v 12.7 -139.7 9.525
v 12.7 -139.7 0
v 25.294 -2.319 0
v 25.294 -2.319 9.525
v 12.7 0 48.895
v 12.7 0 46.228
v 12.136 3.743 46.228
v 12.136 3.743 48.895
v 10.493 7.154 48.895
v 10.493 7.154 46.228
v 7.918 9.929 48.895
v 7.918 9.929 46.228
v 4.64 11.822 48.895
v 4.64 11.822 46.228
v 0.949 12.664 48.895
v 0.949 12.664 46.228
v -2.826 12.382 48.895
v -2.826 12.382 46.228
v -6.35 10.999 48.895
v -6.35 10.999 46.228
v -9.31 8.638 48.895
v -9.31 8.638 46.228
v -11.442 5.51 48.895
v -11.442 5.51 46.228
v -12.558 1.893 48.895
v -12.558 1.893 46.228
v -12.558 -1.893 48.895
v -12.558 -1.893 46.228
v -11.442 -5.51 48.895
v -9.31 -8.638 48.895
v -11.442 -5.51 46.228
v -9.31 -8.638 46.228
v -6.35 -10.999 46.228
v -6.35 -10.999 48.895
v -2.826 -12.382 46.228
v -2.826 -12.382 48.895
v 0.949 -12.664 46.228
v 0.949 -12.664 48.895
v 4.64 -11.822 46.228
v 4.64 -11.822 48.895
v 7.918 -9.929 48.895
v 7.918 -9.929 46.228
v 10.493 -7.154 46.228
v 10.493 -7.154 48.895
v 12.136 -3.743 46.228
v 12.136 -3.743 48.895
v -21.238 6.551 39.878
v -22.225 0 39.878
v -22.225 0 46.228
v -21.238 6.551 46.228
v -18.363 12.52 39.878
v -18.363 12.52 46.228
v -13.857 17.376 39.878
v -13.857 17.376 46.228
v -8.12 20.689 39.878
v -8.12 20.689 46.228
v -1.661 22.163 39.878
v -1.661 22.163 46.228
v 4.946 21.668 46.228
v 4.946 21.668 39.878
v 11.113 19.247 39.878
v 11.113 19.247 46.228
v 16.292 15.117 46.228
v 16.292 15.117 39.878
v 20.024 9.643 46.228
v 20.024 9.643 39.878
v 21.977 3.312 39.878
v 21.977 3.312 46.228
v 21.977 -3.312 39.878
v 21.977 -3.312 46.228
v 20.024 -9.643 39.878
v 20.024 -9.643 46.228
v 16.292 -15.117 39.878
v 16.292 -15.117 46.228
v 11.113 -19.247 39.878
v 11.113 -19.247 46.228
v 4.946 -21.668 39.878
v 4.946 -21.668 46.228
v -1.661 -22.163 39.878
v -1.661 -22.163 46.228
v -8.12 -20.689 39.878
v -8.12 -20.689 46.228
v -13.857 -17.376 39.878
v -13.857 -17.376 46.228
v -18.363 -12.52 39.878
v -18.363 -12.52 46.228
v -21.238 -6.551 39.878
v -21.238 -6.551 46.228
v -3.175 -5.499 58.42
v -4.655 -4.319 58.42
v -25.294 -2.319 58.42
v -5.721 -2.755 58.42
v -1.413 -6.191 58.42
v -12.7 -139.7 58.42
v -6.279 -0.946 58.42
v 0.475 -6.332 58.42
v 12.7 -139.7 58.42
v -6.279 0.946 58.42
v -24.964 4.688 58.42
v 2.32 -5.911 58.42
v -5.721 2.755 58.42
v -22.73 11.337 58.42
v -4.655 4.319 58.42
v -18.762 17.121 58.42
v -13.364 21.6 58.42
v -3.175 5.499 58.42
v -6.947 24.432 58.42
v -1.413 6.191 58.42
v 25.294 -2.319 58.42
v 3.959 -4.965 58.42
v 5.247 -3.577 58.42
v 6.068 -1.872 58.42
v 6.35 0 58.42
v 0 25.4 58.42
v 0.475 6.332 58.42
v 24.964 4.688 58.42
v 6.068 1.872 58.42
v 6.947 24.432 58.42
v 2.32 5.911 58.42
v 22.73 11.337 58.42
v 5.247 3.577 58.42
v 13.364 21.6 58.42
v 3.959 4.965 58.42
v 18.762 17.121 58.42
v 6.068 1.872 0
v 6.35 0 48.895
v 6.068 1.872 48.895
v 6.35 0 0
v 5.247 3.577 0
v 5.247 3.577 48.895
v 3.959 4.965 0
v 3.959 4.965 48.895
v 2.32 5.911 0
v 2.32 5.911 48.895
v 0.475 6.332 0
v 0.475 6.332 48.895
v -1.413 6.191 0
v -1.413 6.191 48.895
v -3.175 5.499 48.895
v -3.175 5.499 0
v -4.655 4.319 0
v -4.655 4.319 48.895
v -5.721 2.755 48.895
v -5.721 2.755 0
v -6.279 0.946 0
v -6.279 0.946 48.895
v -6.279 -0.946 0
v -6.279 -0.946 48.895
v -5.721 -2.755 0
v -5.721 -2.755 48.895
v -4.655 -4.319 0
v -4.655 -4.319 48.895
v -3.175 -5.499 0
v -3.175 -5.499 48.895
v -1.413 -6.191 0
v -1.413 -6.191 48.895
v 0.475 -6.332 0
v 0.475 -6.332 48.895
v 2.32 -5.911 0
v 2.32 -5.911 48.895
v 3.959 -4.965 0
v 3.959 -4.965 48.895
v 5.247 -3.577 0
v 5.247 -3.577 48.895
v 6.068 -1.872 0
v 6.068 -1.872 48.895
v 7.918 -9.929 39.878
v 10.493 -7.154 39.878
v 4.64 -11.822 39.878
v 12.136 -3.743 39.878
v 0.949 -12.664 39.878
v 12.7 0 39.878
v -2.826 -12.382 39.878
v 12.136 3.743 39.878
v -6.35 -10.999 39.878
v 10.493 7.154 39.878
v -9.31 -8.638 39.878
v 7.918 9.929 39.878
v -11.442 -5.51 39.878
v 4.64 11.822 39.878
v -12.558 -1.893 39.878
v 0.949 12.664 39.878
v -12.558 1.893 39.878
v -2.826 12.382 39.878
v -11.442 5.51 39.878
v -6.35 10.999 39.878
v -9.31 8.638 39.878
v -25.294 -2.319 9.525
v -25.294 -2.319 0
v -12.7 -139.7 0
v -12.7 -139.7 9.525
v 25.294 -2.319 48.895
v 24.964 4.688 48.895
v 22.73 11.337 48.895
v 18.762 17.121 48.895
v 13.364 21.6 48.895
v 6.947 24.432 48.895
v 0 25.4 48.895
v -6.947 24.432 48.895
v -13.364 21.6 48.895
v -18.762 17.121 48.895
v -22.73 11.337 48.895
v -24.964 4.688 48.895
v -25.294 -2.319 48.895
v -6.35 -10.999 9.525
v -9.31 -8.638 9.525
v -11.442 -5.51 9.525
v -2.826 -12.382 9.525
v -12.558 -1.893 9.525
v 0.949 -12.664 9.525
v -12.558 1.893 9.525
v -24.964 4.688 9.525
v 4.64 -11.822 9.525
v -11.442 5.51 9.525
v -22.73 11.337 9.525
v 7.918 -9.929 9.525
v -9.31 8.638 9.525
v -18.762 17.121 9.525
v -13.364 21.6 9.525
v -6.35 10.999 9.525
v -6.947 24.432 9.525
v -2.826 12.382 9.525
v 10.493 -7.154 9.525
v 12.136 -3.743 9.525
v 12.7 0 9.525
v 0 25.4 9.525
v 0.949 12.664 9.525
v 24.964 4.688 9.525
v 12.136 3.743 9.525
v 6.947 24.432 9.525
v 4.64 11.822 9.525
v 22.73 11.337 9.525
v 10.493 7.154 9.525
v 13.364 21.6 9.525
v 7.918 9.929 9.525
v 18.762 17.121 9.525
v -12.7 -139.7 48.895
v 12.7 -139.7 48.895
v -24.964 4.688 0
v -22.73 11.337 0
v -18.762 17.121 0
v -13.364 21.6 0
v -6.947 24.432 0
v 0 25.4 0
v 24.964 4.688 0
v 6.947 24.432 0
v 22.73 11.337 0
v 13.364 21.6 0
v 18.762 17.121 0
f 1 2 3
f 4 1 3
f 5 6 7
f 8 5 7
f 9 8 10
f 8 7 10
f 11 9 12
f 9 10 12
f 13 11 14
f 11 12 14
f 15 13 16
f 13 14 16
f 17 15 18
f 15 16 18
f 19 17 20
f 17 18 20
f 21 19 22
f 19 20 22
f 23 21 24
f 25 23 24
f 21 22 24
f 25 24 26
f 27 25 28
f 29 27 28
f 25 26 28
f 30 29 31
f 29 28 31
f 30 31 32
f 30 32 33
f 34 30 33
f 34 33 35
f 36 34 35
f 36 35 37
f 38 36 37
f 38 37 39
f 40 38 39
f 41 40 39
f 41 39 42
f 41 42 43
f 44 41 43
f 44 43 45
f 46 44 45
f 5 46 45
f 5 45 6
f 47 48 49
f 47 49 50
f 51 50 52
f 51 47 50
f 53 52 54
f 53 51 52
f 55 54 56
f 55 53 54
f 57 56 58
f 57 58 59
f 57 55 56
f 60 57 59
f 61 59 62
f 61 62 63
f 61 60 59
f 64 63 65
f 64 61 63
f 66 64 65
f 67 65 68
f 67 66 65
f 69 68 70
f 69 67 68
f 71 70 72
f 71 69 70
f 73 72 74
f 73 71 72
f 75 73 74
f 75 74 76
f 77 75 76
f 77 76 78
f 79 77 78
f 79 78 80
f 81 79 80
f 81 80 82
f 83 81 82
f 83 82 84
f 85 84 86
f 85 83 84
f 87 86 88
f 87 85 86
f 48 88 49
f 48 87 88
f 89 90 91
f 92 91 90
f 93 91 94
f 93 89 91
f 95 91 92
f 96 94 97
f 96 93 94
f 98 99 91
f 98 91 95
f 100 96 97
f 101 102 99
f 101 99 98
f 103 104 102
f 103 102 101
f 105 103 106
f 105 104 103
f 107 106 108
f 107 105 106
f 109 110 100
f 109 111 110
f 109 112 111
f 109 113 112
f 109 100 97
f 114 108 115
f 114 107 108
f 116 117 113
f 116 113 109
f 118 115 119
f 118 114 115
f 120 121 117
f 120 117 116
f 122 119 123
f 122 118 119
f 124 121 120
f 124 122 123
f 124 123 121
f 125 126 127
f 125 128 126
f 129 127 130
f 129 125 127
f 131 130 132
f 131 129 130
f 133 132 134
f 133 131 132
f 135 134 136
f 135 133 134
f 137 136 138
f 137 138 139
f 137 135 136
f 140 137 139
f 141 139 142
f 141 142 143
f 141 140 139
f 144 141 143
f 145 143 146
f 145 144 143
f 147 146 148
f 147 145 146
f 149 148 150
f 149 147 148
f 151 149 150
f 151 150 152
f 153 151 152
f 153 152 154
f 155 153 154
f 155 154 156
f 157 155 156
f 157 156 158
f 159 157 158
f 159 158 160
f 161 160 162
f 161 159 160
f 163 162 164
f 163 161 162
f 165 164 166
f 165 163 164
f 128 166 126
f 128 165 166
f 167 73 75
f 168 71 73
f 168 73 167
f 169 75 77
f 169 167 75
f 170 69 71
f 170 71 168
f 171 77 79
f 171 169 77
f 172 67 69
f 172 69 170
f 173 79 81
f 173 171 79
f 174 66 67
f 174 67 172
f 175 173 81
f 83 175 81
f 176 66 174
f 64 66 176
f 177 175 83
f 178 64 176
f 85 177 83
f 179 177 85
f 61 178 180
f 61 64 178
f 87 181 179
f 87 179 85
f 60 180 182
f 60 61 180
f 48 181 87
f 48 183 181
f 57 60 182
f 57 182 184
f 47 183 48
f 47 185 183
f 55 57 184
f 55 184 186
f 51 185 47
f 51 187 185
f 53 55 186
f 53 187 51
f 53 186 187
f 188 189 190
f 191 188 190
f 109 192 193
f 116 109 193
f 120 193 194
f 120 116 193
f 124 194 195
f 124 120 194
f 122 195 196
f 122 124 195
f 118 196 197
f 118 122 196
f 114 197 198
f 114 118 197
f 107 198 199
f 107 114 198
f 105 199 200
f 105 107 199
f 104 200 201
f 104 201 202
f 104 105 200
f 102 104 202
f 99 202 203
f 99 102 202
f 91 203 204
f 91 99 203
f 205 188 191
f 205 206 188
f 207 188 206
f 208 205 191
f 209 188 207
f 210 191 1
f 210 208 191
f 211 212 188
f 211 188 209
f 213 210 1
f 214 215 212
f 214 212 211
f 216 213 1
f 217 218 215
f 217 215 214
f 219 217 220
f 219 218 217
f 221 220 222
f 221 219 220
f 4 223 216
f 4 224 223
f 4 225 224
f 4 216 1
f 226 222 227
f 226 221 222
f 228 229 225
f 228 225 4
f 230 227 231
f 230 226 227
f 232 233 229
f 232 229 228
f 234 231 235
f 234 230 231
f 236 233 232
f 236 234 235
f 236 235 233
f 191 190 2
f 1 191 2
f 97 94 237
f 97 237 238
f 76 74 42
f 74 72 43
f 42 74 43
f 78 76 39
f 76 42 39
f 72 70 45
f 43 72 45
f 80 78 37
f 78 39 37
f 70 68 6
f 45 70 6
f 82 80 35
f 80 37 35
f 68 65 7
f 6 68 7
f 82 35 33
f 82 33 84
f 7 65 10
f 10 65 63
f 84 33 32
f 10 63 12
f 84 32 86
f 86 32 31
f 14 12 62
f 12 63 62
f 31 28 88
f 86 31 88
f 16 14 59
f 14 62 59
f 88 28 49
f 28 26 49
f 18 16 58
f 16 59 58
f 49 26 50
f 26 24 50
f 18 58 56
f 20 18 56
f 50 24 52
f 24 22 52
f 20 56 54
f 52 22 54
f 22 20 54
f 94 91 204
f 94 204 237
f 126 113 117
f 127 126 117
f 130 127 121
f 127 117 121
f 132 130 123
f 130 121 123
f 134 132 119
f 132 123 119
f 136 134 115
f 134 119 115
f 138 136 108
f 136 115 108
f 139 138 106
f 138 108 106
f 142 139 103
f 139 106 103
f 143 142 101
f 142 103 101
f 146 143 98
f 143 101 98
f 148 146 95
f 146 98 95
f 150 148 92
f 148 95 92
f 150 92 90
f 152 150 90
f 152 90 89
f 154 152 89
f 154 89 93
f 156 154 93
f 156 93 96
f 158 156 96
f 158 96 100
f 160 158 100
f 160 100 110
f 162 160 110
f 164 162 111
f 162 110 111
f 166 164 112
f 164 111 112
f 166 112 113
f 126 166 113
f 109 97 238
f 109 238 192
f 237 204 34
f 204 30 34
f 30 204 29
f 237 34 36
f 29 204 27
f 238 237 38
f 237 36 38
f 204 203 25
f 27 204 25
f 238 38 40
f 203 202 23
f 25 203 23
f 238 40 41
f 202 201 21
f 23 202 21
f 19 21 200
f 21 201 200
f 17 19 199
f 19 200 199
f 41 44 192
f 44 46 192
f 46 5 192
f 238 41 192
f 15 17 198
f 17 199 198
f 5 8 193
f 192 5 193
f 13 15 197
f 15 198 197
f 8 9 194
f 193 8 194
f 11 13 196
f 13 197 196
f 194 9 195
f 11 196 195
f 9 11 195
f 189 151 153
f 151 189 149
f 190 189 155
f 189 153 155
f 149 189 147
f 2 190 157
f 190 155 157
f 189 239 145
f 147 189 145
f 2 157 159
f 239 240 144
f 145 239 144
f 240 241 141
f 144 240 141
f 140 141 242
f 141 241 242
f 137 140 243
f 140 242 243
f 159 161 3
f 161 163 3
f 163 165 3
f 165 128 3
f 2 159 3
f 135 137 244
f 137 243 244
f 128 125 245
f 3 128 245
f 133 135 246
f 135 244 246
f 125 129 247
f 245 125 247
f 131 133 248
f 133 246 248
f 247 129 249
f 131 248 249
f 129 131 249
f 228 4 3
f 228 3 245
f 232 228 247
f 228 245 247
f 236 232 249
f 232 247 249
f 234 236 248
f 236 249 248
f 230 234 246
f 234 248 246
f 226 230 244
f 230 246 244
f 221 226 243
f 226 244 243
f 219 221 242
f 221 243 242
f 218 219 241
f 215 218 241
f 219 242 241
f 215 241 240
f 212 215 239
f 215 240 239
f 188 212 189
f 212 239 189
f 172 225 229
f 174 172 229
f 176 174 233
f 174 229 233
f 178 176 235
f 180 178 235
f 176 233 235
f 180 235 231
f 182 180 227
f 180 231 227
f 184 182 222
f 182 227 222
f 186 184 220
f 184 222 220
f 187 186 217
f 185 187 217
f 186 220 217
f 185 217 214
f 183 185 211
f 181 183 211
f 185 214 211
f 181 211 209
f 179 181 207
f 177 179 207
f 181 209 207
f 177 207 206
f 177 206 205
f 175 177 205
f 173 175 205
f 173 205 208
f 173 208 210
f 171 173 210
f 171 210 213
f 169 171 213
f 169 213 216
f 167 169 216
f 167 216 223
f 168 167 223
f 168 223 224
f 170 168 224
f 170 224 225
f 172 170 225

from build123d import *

# Parameters (mm, degrees)
SKETCH1_R           = 25.4
SKETCH1_R_2         = 6.35
BOSS_EXTRUDE1_DEPTH = 9.525
SKETCH2_R           = 12.7
SKETCH2_R_2         = 6.35
BOSS_EXTRUDE2_DEPTH = 39.37
SKETCH3_R           = 22.225
SKETCH3_R_2         = 12.7
BOSS_EXTRUDE3_DEPTH = 6.35


with BuildPart() as part:
    # Sketch1 → Boss-Extrude1 (new body)
    with BuildSketch(Plane.XY):
        with BuildLine():
            ThreePointArc((25.293941551, -2.318732586), (0, -25.4), (-25.293941551, -2.318732586))
            Line((-25.293941551, -2.318732586), (-12.7, -139.7))
            Line((-12.7, -139.7), (12.7, -139.7))
            Line((12.7, -139.7), (25.293941551, -2.318732586))
        make_face()
        Circle(SKETCH1_R)
        Circle(SKETCH1_R_2, mode=Mode.SUBTRACT)
    boss_extrude1 = extrude(amount=BOSS_EXTRUDE1_DEPTH)

    # Sketch2 → Boss-Extrude2 (add)
    with BuildSketch(Plane.XY.offset(9.525)):
        Circle(SKETCH2_R)
        Circle(SKETCH2_R_2, mode=Mode.SUBTRACT)
    extrude(amount=BOSS_EXTRUDE2_DEPTH)

    # Mirror2: Boss-Extrude1 across plane
    add(boss_extrude1.mirror(Plane(origin=(0, 0, 29.21), x_dir=(1, 0, 0), z_dir=(0, 0, -1))))

    # Sketch3 → Boss-Extrude3 (add)
    with BuildSketch(Plane(origin=(0, 0, 39.878), x_dir=(-1, 0, 0), z_dir=(0, 0, -1))):
        Circle(SKETCH3_R)
        Circle(SKETCH3_R_2, mode=Mode.SUBTRACT)
    extrude(amount=-BOSS_EXTRUDE3_DEPTH)


solid = part.part
